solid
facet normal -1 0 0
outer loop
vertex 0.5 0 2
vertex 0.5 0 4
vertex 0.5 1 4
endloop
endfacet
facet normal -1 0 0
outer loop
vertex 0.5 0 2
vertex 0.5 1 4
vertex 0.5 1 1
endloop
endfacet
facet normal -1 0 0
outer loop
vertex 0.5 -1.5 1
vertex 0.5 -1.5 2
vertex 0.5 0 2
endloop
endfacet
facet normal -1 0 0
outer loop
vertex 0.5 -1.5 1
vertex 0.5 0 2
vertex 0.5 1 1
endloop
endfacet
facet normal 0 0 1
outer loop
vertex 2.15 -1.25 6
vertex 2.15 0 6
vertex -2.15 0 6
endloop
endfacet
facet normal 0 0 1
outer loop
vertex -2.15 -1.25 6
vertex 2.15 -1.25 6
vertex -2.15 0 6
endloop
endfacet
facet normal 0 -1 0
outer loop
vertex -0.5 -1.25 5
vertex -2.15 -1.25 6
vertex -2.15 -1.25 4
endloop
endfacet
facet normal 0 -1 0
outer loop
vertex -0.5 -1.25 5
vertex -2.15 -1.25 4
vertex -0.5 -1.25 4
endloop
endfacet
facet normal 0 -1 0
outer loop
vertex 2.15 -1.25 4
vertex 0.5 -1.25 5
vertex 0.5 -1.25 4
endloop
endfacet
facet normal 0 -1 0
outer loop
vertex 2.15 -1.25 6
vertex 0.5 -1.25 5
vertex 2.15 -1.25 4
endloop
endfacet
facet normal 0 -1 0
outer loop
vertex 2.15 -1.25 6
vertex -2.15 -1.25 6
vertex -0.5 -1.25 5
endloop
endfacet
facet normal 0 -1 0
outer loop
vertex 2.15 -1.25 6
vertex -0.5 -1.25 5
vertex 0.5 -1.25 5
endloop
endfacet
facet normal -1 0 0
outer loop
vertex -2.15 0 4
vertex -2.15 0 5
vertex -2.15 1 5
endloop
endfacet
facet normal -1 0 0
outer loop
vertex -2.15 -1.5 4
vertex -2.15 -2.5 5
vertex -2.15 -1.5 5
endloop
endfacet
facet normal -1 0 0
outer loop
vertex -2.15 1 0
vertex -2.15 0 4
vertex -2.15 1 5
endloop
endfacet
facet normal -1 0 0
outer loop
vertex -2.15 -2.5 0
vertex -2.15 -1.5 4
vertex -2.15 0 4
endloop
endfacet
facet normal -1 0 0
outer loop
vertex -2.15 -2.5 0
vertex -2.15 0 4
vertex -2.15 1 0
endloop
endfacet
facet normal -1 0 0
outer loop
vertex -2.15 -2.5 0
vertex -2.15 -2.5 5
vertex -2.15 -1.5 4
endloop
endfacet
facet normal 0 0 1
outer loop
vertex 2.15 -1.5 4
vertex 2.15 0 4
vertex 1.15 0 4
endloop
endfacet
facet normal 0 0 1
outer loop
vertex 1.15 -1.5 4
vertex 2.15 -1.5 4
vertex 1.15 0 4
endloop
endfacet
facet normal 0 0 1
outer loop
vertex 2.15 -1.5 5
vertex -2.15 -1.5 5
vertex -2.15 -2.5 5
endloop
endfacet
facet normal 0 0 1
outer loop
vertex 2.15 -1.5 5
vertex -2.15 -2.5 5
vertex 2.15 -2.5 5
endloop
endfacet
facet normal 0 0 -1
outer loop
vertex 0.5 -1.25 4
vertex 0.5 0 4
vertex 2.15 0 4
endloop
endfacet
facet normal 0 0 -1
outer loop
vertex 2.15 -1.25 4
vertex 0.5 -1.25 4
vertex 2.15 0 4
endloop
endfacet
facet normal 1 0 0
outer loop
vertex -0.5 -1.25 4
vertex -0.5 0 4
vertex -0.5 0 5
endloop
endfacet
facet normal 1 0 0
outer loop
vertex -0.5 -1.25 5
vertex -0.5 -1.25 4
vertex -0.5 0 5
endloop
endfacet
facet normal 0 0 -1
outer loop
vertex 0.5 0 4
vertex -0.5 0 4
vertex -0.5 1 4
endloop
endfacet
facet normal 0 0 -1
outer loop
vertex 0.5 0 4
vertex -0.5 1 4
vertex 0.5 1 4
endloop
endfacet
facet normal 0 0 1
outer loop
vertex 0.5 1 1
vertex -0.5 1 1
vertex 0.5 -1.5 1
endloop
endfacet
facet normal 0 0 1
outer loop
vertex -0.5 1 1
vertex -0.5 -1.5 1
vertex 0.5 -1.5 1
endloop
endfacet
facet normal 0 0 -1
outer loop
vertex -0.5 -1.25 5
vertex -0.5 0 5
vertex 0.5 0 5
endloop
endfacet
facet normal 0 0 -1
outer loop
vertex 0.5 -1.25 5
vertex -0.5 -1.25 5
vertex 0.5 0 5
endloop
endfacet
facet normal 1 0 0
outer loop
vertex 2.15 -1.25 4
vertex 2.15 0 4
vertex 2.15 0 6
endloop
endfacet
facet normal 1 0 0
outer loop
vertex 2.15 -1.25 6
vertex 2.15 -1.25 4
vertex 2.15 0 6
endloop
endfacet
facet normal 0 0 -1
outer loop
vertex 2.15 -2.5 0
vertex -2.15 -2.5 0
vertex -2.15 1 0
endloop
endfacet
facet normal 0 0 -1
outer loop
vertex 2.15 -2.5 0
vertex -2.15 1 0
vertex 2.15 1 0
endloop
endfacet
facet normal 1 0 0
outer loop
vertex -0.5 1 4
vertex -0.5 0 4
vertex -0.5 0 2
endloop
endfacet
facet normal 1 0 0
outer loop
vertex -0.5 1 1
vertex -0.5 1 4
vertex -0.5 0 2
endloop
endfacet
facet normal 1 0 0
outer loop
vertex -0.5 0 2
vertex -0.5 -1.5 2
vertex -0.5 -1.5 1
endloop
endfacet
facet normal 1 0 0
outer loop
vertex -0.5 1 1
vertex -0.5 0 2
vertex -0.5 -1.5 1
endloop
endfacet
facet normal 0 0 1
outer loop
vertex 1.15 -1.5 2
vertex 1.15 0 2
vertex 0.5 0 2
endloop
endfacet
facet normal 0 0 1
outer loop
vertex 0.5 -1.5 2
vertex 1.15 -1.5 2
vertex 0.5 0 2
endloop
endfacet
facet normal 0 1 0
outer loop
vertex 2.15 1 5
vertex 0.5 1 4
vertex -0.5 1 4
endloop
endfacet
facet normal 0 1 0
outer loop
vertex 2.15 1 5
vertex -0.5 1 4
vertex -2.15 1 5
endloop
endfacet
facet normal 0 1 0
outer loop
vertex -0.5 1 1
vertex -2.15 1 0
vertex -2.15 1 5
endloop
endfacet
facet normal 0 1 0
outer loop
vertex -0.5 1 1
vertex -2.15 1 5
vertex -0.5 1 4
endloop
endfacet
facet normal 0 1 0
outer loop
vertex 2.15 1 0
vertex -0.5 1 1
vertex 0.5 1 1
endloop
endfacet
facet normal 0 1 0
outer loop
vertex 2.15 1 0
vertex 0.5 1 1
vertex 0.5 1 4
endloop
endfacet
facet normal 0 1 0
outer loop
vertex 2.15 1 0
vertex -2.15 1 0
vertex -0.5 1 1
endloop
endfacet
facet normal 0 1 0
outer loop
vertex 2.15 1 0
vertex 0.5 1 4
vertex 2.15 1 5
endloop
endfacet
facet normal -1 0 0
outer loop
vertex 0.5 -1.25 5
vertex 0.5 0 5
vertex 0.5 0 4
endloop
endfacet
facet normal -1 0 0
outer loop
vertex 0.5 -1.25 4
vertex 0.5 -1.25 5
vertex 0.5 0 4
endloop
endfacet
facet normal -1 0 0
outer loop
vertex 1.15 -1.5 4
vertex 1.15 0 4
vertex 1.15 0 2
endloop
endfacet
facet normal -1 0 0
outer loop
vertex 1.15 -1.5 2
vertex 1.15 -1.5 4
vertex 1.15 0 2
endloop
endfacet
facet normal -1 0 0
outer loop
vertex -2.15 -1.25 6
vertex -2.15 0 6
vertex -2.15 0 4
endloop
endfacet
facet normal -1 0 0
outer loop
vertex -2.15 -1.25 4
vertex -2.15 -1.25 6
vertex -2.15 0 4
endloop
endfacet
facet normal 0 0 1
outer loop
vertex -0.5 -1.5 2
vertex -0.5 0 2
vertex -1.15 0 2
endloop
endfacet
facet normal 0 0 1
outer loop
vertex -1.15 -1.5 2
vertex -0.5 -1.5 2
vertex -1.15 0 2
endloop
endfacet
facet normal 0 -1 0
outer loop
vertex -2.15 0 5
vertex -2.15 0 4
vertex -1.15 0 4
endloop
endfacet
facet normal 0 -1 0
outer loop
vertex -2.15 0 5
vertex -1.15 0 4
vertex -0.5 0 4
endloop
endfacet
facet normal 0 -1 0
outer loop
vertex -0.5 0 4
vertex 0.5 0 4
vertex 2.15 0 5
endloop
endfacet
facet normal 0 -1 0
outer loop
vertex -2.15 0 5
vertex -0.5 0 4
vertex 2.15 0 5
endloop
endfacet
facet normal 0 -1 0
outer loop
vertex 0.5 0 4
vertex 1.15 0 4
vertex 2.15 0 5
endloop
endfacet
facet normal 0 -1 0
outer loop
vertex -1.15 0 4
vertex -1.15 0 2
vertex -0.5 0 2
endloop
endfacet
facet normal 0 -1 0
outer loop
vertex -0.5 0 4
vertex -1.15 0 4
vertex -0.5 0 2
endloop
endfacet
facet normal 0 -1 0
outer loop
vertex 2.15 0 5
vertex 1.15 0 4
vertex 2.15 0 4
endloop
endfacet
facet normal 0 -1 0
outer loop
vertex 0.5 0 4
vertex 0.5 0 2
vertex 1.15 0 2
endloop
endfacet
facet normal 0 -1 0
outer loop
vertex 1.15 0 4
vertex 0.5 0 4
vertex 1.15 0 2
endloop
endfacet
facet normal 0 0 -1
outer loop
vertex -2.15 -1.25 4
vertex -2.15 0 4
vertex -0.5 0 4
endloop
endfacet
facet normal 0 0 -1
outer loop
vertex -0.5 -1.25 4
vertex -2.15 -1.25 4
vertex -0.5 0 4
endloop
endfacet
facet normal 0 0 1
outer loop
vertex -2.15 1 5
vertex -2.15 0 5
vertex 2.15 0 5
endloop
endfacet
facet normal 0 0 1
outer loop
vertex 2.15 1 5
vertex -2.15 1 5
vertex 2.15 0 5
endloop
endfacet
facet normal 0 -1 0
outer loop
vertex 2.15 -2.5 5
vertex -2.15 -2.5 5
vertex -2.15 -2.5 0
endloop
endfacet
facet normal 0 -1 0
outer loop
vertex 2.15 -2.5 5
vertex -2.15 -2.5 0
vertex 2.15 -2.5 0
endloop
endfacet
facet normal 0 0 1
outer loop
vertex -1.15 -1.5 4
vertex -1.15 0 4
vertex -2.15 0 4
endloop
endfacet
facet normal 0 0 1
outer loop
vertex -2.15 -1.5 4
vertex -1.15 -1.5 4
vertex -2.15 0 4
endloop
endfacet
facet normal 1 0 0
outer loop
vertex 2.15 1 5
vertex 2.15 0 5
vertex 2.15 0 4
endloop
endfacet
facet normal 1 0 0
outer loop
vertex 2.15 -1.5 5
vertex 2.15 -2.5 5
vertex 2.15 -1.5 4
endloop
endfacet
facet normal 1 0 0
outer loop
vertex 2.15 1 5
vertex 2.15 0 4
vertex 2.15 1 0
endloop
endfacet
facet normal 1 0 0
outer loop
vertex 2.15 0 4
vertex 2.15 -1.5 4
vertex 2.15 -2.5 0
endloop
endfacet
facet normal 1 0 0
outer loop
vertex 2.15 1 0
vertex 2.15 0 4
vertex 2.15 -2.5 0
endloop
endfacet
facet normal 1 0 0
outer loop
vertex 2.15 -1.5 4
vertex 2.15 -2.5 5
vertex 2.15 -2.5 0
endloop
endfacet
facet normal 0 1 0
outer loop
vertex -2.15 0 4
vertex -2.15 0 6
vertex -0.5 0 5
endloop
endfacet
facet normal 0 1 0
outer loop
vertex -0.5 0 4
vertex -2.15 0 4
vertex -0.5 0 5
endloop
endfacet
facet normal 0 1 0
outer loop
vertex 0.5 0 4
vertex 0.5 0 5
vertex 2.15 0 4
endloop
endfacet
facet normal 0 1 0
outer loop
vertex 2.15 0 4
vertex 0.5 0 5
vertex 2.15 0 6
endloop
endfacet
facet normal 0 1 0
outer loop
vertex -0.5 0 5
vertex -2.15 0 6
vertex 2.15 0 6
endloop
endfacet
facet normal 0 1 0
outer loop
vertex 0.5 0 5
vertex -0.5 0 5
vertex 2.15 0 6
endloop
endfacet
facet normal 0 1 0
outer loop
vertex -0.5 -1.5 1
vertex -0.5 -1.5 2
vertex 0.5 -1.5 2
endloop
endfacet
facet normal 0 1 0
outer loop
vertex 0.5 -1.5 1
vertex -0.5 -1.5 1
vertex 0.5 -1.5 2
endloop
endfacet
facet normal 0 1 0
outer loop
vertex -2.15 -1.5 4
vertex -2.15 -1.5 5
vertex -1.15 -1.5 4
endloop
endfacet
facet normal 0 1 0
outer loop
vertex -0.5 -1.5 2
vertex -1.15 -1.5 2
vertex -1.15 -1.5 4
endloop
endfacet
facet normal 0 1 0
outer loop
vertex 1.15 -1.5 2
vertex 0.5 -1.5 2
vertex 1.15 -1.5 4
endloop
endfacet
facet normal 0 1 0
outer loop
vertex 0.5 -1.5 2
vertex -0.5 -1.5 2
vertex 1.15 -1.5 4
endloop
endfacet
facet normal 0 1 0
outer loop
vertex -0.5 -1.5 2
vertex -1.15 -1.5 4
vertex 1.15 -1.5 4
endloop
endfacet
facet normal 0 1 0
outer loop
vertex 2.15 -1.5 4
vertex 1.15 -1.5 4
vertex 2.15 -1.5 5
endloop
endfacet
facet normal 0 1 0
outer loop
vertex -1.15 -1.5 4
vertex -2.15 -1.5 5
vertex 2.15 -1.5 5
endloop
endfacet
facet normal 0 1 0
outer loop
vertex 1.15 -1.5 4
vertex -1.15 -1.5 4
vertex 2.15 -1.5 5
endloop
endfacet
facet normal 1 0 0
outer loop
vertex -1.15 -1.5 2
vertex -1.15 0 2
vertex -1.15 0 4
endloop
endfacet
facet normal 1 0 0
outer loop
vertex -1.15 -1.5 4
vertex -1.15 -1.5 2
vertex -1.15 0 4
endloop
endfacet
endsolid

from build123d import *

# Parameters (mm, degrees)
PAD_DEPTH     = 1.5
SKETCH001_W   = 4.3
SKETCH001_H   = 5
PAD001_DEPTH  = 1
SKETCH002_W   = 4.3
SKETCH002_H   = 5
SKETCH002_W_2 = 1
SKETCH002_H_2 = 3
PAD002_DEPTH  = 1
PAD003_DEPTH  = 1.25


with BuildPart() as body:
    # Sketch → Pad (new body)
    with BuildSketch(Plane.XZ):
        Polygon((-2.15, 4), (-2.15, 0), (2.15, 0), (2.15, 4), (1.15, 4), (1.15, 2), (0.5, 2), (0.5, 1), (-0.5, 1), (-0.5, 2), (-1.15, 2), (-1.15, 4), align=None)
    extrude(amount=PAD_DEPTH)

    # Sketch001 (on Face14 of Pad) → Pad001 (join)
    with BuildSketch(Plane.XZ.offset(1.5)):
        with Locations((0, 2.5)):
            Rectangle(SKETCH001_W, SKETCH001_H)
    extrude(amount=PAD001_DEPTH)

    # Sketch002 (on Face4 of Pad001) → Pad002 (join)
    with BuildSketch(Plane(origin=(0, 0, 0), x_dir=(1, 0, 0), z_dir=(0, 1, 0))):
        with Locations((0, -2.5)):
            Rectangle(SKETCH002_W, SKETCH002_H)
        with Locations((0, -2.5)):
            Rectangle(SKETCH002_W_2, SKETCH002_H_2, mode=Mode.SUBTRACT)
    extrude(amount=PAD002_DEPTH)


with BuildPart() as top:
    # Sketch003 → Pad003 (new body)
    with BuildSketch(Plane.XZ):
        Polygon((-2.15, 6), (-2.15, 4), (-0.5, 4), (-0.5, 5), (0.5, 5), (0.5, 4), (2.15, 4), (2.15, 6), align=None)
    extrude(amount=PAD003_DEPTH)


solid = Compound([body.part, top.part])
